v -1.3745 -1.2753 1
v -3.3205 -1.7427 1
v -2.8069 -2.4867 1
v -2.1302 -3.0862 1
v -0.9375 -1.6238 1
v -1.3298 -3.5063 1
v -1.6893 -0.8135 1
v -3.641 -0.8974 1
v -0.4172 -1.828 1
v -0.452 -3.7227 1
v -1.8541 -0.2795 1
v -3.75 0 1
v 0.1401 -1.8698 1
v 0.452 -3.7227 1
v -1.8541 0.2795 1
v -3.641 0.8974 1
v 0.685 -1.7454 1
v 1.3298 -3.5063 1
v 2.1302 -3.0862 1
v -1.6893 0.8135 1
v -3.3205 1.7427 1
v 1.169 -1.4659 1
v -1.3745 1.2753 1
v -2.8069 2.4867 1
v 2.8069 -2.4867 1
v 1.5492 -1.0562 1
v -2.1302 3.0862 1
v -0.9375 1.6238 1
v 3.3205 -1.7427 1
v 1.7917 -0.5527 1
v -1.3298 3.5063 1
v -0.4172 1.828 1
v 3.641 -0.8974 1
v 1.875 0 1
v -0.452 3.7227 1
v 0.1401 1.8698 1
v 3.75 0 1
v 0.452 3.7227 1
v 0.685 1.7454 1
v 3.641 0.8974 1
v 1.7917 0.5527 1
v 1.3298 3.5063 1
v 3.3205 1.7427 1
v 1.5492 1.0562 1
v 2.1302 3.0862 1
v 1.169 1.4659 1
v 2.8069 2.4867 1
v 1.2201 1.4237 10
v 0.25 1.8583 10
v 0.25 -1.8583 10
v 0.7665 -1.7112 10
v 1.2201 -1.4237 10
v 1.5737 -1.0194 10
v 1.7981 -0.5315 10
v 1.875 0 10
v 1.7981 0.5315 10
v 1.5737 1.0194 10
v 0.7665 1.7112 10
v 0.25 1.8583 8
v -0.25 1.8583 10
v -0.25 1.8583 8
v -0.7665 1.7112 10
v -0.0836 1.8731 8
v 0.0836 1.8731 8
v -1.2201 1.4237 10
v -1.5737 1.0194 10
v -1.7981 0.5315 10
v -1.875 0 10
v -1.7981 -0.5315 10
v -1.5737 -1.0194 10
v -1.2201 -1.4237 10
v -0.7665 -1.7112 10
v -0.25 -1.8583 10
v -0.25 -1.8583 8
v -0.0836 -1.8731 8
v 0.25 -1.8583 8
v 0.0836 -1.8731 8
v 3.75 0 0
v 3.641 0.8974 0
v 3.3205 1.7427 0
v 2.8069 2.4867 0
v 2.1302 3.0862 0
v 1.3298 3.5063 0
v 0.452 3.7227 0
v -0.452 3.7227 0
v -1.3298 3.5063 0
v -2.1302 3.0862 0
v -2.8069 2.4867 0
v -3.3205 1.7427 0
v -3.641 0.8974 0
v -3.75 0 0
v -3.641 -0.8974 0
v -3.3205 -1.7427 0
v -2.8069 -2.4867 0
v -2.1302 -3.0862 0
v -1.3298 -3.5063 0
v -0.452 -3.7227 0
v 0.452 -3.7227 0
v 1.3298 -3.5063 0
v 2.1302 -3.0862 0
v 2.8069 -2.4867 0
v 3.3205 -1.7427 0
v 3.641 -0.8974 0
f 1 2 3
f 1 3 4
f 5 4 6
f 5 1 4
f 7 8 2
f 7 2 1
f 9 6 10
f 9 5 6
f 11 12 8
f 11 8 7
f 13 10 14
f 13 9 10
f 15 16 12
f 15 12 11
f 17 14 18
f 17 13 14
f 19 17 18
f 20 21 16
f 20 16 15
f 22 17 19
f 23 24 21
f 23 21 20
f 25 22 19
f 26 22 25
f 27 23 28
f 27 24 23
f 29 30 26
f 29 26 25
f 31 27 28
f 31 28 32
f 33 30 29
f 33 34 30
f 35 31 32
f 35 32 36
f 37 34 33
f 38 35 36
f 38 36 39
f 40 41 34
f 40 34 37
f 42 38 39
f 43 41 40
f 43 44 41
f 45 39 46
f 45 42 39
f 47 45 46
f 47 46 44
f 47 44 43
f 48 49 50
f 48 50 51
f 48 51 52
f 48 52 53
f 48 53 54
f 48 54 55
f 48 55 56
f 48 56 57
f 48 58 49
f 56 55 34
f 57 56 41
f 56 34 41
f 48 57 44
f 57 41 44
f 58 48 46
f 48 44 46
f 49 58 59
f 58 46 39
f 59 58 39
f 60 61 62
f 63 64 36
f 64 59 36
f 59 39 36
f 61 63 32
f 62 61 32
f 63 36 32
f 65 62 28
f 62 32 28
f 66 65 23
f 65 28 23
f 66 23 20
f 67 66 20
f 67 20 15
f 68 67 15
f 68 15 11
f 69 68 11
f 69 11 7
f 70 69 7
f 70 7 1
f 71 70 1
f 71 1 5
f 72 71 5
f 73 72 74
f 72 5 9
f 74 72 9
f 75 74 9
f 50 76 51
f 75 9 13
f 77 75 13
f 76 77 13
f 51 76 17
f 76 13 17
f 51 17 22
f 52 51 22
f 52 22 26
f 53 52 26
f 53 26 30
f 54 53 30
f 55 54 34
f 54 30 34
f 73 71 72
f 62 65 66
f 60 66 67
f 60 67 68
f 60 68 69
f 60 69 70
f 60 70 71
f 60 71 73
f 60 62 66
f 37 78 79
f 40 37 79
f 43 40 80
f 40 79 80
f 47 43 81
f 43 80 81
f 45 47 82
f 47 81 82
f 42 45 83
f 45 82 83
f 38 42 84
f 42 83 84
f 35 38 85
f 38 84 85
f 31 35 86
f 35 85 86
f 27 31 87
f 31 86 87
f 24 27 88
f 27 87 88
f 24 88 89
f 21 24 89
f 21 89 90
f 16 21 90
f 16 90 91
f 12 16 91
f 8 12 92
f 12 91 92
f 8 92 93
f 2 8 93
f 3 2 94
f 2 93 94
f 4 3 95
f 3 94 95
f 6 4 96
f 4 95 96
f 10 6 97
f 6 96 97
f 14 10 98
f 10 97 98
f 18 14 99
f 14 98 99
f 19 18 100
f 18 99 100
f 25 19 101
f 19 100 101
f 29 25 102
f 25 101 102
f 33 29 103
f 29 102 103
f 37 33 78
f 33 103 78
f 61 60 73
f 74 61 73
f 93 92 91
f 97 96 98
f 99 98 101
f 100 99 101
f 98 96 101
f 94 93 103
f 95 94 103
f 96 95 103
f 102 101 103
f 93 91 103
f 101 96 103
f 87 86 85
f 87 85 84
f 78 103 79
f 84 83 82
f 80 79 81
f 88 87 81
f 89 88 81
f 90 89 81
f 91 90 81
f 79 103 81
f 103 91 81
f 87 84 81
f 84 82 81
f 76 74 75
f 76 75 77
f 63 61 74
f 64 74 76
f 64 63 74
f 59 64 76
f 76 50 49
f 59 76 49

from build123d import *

# Parameters (mm, degrees)
F0_R     = 1.875
F1_DEPTH = 10
F0_R_2   = 3.75
F2_DEPTH = 1
F4_DEPTH = 2


with BuildPart() as f1:
    # F0 (on Top) → F1 (new body)
    with BuildSketch(Plane.XY):
        Circle(F0_R)
    extrude(amount=F1_DEPTH)

    # F0 (on Top) → F2 (join)
    with BuildSketch(Plane.XY):
        Circle(F0_R_2)
        Circle(F0_R, mode=Mode.SUBTRACT)
    extrude(amount=F2_DEPTH)

    # F3 (on face) → F4 (cut)
    with BuildSketch(Plane.XY.offset(10)):
        with BuildLine():
            Line((-0.25, 1.8582585934), (-0.25, -1.8582585934))
            ThreePointArc((-0.25, -1.8582585934), (0, -1.875), (0.25, -1.8582585934))
            Line((0.25, -1.8582585934), (0.25, 1.8582585934))
            ThreePointArc((0.25, 1.8582585934), (0, 1.875), (-0.25, 1.8582585934))
        make_face()
        with BuildLine():
            Line((-0.25, 2.5), (-0.25, 1.8582585934))
            ThreePointArc((-0.25, 1.8582585934), (0, 1.875), (0.25, 1.8582585934))
            Line((0.25, 1.8582585934), (0.25, 2.5))
            Line((0.25, 2.5), (-0.25, 2.5))
        make_face()
    extrude(amount=-F4_DEPTH, mode=Mode.SUBTRACT)


solid = f1.part
